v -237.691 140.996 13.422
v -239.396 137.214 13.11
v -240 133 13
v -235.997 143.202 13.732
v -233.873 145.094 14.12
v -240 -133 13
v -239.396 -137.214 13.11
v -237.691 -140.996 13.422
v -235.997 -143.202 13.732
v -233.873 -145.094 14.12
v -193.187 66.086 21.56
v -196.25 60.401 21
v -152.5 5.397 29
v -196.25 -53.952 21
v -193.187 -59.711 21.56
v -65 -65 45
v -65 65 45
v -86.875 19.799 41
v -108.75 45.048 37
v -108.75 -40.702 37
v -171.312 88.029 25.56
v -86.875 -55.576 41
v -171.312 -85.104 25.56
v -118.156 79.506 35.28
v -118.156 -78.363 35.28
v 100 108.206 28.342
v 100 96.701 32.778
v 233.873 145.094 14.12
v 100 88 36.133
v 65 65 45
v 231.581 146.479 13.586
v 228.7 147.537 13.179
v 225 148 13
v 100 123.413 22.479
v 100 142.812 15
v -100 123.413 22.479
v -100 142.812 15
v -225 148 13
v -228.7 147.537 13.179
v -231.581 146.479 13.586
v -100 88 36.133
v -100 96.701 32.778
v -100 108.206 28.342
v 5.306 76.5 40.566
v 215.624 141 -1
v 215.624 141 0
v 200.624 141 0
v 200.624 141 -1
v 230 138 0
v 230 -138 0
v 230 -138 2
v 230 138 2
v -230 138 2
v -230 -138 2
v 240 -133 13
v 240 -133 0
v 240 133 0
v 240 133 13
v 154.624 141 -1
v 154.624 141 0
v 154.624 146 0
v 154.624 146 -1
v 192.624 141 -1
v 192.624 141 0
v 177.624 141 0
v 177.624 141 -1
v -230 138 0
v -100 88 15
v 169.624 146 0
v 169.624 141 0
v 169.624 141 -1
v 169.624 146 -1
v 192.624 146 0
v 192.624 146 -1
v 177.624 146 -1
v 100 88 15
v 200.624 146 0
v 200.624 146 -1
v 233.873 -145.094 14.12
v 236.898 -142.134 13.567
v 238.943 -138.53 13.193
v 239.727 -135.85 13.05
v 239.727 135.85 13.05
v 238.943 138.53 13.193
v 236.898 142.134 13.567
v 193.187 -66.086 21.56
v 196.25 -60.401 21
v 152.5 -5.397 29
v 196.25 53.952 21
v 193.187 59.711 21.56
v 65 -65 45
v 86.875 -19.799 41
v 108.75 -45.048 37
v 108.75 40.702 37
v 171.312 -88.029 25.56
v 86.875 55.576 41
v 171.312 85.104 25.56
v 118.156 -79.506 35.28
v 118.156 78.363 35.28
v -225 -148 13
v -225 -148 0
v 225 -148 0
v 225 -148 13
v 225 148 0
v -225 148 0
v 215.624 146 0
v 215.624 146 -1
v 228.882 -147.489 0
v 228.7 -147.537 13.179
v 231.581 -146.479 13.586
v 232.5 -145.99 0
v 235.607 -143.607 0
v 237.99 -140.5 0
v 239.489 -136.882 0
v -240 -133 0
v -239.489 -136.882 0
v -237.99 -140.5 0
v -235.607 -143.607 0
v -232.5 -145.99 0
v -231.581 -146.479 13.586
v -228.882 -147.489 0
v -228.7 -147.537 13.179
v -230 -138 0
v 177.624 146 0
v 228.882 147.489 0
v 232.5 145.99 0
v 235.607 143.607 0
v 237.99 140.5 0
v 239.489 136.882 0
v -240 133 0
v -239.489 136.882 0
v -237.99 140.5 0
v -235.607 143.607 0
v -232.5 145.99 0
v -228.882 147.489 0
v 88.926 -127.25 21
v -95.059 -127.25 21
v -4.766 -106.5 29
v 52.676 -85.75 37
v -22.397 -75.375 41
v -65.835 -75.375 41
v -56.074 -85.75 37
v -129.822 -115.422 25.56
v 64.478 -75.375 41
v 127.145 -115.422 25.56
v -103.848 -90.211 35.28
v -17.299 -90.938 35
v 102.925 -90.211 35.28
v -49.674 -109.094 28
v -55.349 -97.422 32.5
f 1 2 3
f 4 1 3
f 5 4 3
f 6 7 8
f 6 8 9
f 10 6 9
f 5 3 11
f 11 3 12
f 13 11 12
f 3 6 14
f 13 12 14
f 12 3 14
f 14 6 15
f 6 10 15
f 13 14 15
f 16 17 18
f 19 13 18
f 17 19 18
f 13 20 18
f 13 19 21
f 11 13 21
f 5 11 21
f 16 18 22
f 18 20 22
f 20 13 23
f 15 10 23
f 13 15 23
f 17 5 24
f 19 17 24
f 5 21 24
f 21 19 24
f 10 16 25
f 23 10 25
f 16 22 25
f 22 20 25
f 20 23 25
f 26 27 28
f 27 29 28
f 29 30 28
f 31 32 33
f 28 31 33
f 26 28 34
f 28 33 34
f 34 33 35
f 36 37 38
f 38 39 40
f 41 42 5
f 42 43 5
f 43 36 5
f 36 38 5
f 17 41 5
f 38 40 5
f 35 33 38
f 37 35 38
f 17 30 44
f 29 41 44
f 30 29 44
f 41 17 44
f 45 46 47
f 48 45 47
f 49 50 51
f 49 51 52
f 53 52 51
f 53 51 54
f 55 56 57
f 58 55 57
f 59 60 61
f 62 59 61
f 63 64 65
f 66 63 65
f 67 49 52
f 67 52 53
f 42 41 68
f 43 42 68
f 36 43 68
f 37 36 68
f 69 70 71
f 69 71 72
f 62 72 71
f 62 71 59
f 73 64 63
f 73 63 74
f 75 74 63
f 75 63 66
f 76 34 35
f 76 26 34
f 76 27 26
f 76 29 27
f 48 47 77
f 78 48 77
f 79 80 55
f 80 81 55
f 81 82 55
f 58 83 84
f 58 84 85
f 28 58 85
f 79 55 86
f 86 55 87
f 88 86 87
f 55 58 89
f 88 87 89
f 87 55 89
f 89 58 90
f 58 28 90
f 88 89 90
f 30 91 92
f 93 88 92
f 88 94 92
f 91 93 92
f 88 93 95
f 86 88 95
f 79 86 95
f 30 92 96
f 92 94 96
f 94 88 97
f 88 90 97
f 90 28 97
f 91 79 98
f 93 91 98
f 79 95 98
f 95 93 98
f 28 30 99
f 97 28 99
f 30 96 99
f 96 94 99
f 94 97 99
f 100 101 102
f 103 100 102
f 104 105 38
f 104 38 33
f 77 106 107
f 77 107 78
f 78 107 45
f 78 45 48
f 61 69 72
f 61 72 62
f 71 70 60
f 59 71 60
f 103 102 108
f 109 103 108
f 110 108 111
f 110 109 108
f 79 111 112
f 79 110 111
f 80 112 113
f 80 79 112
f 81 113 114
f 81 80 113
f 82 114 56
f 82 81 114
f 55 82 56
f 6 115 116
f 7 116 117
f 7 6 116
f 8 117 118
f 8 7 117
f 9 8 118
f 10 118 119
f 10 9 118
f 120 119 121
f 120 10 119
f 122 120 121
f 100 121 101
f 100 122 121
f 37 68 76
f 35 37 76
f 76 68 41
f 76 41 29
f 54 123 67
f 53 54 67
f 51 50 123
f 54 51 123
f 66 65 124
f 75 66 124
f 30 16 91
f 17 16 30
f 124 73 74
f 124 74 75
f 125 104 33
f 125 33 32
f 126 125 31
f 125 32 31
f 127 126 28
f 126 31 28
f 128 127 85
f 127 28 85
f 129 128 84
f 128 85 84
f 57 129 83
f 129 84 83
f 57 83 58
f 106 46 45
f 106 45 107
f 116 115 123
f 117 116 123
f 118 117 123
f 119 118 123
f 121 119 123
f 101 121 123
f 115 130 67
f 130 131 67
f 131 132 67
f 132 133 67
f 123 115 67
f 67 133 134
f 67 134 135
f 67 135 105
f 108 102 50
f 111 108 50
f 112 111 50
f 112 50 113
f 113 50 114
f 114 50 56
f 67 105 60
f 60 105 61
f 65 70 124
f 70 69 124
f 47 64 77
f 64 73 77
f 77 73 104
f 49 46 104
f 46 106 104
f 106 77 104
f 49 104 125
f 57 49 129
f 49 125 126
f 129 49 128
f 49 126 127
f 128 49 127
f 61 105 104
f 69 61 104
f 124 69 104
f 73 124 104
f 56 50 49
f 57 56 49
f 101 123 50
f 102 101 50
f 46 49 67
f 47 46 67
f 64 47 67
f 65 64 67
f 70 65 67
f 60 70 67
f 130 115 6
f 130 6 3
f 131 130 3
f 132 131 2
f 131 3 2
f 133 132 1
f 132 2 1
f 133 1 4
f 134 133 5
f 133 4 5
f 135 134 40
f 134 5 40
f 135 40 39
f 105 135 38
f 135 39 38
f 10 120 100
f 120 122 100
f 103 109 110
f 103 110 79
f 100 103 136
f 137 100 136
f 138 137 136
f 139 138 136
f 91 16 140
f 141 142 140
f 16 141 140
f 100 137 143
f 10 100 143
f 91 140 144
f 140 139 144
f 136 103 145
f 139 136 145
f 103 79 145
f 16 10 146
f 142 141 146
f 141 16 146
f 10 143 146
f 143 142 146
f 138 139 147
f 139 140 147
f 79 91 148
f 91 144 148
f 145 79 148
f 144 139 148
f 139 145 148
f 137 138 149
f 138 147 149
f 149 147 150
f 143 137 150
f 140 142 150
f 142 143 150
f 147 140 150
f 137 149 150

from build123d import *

# Parameters (mm, degrees)
ESQUISSE1_W             = 480
ESQUISSE1_H             = 296
BOSS_EXTRU_1_DEPTH      = 13
ESQUISSE2_W             = 130
ESQUISSE2_H             = 130
ESQUISSE3_W             = 460
ESQUISSE3_H             = 276
ENL_V_MAT_EXTRU_1_DEPTH = 2
CONG_1_R                = 15
ESQUISSE4_W             = 200
ESQUISSE4_H             = 53.029675638
ENL_V_MAT_EXTRU_2_DEPTH = 61.0000001
ESQUISSE5_W             = 15
ESQUISSE5_H             = 5
BOSS_EXTRU_2_DEPTH      = 1


with BuildPart() as part:
    # Esquisse1 → Boss.-Extru.1 (new body)
    with BuildSketch(Plane.XY):
        Rectangle(ESQUISSE1_W, ESQUISSE1_H)
    extrude(amount=BOSS_EXTRU_1_DEPTH)

    # Esquisse2 → section 0 of lissage1
    with BuildSketch(Plane.XY.offset(45), mode=Mode.PRIVATE) as lissage1_s0:
        Rectangle(ESQUISSE2_W, ESQUISSE2_H)
    # loft up to a face of the part (lissage1)
    loft([lissage1_s0.sketch, part.faces().sort_by_distance((0, 0, 13))[0]])

    # Esquisse3 → Enlèv. mat.-Extru.1 (cut)
    with BuildSketch(Plane(origin=(0, 0, 0), x_dir=(-1, 0, 0), z_dir=(0, 0, -1))):
        Rectangle(ESQUISSE3_W, ESQUISSE3_H)
    extrude(amount=-ENL_V_MAT_EXTRU_1_DEPTH, mode=Mode.SUBTRACT)

    # Congé1
    cong_1_edges = [part.edges().sort_by_distance(p)[0] for p in [
        (-240, 148, 6.5),
        (240, 148, 6.5),
        (240, -148, 6.5),
        (-240, -148, 6.5),
    ]]
    fillet(cong_1_edges, radius=CONG_1_R)

    # Esquisse4 → Enlèv. mat.-Extru.2 (cut, through all)
    with BuildSketch(Plane(origin=(0, 88, 0), x_dir=(1, 0, 0), z_dir=(0, 1, 0))):
        with Locations((0, -41.514837819)):
            Rectangle(ESQUISSE4_W, ESQUISSE4_H)
    extrude(amount=ENL_V_MAT_EXTRU_2_DEPTH, mode=Mode.SUBTRACT)

    # Esquisse5 → Boss.-Extru.2 (add)
    with BuildSketch(Plane(origin=(0, 0, 0), x_dir=(-1, 0, 0), z_dir=(0, 0, -1))):
        with Locations((-208.124292846, 143.5)):
            Rectangle(ESQUISSE5_W, ESQUISSE5_H)
        with Locations((-185.124292846, 143.5)):
            Rectangle(ESQUISSE5_W, ESQUISSE5_H)
        with Locations((-162.124292846, 143.5)):
            Rectangle(ESQUISSE5_W, ESQUISSE5_H)
    extrude(amount=BOSS_EXTRU_2_DEPTH)


solid = part.part
